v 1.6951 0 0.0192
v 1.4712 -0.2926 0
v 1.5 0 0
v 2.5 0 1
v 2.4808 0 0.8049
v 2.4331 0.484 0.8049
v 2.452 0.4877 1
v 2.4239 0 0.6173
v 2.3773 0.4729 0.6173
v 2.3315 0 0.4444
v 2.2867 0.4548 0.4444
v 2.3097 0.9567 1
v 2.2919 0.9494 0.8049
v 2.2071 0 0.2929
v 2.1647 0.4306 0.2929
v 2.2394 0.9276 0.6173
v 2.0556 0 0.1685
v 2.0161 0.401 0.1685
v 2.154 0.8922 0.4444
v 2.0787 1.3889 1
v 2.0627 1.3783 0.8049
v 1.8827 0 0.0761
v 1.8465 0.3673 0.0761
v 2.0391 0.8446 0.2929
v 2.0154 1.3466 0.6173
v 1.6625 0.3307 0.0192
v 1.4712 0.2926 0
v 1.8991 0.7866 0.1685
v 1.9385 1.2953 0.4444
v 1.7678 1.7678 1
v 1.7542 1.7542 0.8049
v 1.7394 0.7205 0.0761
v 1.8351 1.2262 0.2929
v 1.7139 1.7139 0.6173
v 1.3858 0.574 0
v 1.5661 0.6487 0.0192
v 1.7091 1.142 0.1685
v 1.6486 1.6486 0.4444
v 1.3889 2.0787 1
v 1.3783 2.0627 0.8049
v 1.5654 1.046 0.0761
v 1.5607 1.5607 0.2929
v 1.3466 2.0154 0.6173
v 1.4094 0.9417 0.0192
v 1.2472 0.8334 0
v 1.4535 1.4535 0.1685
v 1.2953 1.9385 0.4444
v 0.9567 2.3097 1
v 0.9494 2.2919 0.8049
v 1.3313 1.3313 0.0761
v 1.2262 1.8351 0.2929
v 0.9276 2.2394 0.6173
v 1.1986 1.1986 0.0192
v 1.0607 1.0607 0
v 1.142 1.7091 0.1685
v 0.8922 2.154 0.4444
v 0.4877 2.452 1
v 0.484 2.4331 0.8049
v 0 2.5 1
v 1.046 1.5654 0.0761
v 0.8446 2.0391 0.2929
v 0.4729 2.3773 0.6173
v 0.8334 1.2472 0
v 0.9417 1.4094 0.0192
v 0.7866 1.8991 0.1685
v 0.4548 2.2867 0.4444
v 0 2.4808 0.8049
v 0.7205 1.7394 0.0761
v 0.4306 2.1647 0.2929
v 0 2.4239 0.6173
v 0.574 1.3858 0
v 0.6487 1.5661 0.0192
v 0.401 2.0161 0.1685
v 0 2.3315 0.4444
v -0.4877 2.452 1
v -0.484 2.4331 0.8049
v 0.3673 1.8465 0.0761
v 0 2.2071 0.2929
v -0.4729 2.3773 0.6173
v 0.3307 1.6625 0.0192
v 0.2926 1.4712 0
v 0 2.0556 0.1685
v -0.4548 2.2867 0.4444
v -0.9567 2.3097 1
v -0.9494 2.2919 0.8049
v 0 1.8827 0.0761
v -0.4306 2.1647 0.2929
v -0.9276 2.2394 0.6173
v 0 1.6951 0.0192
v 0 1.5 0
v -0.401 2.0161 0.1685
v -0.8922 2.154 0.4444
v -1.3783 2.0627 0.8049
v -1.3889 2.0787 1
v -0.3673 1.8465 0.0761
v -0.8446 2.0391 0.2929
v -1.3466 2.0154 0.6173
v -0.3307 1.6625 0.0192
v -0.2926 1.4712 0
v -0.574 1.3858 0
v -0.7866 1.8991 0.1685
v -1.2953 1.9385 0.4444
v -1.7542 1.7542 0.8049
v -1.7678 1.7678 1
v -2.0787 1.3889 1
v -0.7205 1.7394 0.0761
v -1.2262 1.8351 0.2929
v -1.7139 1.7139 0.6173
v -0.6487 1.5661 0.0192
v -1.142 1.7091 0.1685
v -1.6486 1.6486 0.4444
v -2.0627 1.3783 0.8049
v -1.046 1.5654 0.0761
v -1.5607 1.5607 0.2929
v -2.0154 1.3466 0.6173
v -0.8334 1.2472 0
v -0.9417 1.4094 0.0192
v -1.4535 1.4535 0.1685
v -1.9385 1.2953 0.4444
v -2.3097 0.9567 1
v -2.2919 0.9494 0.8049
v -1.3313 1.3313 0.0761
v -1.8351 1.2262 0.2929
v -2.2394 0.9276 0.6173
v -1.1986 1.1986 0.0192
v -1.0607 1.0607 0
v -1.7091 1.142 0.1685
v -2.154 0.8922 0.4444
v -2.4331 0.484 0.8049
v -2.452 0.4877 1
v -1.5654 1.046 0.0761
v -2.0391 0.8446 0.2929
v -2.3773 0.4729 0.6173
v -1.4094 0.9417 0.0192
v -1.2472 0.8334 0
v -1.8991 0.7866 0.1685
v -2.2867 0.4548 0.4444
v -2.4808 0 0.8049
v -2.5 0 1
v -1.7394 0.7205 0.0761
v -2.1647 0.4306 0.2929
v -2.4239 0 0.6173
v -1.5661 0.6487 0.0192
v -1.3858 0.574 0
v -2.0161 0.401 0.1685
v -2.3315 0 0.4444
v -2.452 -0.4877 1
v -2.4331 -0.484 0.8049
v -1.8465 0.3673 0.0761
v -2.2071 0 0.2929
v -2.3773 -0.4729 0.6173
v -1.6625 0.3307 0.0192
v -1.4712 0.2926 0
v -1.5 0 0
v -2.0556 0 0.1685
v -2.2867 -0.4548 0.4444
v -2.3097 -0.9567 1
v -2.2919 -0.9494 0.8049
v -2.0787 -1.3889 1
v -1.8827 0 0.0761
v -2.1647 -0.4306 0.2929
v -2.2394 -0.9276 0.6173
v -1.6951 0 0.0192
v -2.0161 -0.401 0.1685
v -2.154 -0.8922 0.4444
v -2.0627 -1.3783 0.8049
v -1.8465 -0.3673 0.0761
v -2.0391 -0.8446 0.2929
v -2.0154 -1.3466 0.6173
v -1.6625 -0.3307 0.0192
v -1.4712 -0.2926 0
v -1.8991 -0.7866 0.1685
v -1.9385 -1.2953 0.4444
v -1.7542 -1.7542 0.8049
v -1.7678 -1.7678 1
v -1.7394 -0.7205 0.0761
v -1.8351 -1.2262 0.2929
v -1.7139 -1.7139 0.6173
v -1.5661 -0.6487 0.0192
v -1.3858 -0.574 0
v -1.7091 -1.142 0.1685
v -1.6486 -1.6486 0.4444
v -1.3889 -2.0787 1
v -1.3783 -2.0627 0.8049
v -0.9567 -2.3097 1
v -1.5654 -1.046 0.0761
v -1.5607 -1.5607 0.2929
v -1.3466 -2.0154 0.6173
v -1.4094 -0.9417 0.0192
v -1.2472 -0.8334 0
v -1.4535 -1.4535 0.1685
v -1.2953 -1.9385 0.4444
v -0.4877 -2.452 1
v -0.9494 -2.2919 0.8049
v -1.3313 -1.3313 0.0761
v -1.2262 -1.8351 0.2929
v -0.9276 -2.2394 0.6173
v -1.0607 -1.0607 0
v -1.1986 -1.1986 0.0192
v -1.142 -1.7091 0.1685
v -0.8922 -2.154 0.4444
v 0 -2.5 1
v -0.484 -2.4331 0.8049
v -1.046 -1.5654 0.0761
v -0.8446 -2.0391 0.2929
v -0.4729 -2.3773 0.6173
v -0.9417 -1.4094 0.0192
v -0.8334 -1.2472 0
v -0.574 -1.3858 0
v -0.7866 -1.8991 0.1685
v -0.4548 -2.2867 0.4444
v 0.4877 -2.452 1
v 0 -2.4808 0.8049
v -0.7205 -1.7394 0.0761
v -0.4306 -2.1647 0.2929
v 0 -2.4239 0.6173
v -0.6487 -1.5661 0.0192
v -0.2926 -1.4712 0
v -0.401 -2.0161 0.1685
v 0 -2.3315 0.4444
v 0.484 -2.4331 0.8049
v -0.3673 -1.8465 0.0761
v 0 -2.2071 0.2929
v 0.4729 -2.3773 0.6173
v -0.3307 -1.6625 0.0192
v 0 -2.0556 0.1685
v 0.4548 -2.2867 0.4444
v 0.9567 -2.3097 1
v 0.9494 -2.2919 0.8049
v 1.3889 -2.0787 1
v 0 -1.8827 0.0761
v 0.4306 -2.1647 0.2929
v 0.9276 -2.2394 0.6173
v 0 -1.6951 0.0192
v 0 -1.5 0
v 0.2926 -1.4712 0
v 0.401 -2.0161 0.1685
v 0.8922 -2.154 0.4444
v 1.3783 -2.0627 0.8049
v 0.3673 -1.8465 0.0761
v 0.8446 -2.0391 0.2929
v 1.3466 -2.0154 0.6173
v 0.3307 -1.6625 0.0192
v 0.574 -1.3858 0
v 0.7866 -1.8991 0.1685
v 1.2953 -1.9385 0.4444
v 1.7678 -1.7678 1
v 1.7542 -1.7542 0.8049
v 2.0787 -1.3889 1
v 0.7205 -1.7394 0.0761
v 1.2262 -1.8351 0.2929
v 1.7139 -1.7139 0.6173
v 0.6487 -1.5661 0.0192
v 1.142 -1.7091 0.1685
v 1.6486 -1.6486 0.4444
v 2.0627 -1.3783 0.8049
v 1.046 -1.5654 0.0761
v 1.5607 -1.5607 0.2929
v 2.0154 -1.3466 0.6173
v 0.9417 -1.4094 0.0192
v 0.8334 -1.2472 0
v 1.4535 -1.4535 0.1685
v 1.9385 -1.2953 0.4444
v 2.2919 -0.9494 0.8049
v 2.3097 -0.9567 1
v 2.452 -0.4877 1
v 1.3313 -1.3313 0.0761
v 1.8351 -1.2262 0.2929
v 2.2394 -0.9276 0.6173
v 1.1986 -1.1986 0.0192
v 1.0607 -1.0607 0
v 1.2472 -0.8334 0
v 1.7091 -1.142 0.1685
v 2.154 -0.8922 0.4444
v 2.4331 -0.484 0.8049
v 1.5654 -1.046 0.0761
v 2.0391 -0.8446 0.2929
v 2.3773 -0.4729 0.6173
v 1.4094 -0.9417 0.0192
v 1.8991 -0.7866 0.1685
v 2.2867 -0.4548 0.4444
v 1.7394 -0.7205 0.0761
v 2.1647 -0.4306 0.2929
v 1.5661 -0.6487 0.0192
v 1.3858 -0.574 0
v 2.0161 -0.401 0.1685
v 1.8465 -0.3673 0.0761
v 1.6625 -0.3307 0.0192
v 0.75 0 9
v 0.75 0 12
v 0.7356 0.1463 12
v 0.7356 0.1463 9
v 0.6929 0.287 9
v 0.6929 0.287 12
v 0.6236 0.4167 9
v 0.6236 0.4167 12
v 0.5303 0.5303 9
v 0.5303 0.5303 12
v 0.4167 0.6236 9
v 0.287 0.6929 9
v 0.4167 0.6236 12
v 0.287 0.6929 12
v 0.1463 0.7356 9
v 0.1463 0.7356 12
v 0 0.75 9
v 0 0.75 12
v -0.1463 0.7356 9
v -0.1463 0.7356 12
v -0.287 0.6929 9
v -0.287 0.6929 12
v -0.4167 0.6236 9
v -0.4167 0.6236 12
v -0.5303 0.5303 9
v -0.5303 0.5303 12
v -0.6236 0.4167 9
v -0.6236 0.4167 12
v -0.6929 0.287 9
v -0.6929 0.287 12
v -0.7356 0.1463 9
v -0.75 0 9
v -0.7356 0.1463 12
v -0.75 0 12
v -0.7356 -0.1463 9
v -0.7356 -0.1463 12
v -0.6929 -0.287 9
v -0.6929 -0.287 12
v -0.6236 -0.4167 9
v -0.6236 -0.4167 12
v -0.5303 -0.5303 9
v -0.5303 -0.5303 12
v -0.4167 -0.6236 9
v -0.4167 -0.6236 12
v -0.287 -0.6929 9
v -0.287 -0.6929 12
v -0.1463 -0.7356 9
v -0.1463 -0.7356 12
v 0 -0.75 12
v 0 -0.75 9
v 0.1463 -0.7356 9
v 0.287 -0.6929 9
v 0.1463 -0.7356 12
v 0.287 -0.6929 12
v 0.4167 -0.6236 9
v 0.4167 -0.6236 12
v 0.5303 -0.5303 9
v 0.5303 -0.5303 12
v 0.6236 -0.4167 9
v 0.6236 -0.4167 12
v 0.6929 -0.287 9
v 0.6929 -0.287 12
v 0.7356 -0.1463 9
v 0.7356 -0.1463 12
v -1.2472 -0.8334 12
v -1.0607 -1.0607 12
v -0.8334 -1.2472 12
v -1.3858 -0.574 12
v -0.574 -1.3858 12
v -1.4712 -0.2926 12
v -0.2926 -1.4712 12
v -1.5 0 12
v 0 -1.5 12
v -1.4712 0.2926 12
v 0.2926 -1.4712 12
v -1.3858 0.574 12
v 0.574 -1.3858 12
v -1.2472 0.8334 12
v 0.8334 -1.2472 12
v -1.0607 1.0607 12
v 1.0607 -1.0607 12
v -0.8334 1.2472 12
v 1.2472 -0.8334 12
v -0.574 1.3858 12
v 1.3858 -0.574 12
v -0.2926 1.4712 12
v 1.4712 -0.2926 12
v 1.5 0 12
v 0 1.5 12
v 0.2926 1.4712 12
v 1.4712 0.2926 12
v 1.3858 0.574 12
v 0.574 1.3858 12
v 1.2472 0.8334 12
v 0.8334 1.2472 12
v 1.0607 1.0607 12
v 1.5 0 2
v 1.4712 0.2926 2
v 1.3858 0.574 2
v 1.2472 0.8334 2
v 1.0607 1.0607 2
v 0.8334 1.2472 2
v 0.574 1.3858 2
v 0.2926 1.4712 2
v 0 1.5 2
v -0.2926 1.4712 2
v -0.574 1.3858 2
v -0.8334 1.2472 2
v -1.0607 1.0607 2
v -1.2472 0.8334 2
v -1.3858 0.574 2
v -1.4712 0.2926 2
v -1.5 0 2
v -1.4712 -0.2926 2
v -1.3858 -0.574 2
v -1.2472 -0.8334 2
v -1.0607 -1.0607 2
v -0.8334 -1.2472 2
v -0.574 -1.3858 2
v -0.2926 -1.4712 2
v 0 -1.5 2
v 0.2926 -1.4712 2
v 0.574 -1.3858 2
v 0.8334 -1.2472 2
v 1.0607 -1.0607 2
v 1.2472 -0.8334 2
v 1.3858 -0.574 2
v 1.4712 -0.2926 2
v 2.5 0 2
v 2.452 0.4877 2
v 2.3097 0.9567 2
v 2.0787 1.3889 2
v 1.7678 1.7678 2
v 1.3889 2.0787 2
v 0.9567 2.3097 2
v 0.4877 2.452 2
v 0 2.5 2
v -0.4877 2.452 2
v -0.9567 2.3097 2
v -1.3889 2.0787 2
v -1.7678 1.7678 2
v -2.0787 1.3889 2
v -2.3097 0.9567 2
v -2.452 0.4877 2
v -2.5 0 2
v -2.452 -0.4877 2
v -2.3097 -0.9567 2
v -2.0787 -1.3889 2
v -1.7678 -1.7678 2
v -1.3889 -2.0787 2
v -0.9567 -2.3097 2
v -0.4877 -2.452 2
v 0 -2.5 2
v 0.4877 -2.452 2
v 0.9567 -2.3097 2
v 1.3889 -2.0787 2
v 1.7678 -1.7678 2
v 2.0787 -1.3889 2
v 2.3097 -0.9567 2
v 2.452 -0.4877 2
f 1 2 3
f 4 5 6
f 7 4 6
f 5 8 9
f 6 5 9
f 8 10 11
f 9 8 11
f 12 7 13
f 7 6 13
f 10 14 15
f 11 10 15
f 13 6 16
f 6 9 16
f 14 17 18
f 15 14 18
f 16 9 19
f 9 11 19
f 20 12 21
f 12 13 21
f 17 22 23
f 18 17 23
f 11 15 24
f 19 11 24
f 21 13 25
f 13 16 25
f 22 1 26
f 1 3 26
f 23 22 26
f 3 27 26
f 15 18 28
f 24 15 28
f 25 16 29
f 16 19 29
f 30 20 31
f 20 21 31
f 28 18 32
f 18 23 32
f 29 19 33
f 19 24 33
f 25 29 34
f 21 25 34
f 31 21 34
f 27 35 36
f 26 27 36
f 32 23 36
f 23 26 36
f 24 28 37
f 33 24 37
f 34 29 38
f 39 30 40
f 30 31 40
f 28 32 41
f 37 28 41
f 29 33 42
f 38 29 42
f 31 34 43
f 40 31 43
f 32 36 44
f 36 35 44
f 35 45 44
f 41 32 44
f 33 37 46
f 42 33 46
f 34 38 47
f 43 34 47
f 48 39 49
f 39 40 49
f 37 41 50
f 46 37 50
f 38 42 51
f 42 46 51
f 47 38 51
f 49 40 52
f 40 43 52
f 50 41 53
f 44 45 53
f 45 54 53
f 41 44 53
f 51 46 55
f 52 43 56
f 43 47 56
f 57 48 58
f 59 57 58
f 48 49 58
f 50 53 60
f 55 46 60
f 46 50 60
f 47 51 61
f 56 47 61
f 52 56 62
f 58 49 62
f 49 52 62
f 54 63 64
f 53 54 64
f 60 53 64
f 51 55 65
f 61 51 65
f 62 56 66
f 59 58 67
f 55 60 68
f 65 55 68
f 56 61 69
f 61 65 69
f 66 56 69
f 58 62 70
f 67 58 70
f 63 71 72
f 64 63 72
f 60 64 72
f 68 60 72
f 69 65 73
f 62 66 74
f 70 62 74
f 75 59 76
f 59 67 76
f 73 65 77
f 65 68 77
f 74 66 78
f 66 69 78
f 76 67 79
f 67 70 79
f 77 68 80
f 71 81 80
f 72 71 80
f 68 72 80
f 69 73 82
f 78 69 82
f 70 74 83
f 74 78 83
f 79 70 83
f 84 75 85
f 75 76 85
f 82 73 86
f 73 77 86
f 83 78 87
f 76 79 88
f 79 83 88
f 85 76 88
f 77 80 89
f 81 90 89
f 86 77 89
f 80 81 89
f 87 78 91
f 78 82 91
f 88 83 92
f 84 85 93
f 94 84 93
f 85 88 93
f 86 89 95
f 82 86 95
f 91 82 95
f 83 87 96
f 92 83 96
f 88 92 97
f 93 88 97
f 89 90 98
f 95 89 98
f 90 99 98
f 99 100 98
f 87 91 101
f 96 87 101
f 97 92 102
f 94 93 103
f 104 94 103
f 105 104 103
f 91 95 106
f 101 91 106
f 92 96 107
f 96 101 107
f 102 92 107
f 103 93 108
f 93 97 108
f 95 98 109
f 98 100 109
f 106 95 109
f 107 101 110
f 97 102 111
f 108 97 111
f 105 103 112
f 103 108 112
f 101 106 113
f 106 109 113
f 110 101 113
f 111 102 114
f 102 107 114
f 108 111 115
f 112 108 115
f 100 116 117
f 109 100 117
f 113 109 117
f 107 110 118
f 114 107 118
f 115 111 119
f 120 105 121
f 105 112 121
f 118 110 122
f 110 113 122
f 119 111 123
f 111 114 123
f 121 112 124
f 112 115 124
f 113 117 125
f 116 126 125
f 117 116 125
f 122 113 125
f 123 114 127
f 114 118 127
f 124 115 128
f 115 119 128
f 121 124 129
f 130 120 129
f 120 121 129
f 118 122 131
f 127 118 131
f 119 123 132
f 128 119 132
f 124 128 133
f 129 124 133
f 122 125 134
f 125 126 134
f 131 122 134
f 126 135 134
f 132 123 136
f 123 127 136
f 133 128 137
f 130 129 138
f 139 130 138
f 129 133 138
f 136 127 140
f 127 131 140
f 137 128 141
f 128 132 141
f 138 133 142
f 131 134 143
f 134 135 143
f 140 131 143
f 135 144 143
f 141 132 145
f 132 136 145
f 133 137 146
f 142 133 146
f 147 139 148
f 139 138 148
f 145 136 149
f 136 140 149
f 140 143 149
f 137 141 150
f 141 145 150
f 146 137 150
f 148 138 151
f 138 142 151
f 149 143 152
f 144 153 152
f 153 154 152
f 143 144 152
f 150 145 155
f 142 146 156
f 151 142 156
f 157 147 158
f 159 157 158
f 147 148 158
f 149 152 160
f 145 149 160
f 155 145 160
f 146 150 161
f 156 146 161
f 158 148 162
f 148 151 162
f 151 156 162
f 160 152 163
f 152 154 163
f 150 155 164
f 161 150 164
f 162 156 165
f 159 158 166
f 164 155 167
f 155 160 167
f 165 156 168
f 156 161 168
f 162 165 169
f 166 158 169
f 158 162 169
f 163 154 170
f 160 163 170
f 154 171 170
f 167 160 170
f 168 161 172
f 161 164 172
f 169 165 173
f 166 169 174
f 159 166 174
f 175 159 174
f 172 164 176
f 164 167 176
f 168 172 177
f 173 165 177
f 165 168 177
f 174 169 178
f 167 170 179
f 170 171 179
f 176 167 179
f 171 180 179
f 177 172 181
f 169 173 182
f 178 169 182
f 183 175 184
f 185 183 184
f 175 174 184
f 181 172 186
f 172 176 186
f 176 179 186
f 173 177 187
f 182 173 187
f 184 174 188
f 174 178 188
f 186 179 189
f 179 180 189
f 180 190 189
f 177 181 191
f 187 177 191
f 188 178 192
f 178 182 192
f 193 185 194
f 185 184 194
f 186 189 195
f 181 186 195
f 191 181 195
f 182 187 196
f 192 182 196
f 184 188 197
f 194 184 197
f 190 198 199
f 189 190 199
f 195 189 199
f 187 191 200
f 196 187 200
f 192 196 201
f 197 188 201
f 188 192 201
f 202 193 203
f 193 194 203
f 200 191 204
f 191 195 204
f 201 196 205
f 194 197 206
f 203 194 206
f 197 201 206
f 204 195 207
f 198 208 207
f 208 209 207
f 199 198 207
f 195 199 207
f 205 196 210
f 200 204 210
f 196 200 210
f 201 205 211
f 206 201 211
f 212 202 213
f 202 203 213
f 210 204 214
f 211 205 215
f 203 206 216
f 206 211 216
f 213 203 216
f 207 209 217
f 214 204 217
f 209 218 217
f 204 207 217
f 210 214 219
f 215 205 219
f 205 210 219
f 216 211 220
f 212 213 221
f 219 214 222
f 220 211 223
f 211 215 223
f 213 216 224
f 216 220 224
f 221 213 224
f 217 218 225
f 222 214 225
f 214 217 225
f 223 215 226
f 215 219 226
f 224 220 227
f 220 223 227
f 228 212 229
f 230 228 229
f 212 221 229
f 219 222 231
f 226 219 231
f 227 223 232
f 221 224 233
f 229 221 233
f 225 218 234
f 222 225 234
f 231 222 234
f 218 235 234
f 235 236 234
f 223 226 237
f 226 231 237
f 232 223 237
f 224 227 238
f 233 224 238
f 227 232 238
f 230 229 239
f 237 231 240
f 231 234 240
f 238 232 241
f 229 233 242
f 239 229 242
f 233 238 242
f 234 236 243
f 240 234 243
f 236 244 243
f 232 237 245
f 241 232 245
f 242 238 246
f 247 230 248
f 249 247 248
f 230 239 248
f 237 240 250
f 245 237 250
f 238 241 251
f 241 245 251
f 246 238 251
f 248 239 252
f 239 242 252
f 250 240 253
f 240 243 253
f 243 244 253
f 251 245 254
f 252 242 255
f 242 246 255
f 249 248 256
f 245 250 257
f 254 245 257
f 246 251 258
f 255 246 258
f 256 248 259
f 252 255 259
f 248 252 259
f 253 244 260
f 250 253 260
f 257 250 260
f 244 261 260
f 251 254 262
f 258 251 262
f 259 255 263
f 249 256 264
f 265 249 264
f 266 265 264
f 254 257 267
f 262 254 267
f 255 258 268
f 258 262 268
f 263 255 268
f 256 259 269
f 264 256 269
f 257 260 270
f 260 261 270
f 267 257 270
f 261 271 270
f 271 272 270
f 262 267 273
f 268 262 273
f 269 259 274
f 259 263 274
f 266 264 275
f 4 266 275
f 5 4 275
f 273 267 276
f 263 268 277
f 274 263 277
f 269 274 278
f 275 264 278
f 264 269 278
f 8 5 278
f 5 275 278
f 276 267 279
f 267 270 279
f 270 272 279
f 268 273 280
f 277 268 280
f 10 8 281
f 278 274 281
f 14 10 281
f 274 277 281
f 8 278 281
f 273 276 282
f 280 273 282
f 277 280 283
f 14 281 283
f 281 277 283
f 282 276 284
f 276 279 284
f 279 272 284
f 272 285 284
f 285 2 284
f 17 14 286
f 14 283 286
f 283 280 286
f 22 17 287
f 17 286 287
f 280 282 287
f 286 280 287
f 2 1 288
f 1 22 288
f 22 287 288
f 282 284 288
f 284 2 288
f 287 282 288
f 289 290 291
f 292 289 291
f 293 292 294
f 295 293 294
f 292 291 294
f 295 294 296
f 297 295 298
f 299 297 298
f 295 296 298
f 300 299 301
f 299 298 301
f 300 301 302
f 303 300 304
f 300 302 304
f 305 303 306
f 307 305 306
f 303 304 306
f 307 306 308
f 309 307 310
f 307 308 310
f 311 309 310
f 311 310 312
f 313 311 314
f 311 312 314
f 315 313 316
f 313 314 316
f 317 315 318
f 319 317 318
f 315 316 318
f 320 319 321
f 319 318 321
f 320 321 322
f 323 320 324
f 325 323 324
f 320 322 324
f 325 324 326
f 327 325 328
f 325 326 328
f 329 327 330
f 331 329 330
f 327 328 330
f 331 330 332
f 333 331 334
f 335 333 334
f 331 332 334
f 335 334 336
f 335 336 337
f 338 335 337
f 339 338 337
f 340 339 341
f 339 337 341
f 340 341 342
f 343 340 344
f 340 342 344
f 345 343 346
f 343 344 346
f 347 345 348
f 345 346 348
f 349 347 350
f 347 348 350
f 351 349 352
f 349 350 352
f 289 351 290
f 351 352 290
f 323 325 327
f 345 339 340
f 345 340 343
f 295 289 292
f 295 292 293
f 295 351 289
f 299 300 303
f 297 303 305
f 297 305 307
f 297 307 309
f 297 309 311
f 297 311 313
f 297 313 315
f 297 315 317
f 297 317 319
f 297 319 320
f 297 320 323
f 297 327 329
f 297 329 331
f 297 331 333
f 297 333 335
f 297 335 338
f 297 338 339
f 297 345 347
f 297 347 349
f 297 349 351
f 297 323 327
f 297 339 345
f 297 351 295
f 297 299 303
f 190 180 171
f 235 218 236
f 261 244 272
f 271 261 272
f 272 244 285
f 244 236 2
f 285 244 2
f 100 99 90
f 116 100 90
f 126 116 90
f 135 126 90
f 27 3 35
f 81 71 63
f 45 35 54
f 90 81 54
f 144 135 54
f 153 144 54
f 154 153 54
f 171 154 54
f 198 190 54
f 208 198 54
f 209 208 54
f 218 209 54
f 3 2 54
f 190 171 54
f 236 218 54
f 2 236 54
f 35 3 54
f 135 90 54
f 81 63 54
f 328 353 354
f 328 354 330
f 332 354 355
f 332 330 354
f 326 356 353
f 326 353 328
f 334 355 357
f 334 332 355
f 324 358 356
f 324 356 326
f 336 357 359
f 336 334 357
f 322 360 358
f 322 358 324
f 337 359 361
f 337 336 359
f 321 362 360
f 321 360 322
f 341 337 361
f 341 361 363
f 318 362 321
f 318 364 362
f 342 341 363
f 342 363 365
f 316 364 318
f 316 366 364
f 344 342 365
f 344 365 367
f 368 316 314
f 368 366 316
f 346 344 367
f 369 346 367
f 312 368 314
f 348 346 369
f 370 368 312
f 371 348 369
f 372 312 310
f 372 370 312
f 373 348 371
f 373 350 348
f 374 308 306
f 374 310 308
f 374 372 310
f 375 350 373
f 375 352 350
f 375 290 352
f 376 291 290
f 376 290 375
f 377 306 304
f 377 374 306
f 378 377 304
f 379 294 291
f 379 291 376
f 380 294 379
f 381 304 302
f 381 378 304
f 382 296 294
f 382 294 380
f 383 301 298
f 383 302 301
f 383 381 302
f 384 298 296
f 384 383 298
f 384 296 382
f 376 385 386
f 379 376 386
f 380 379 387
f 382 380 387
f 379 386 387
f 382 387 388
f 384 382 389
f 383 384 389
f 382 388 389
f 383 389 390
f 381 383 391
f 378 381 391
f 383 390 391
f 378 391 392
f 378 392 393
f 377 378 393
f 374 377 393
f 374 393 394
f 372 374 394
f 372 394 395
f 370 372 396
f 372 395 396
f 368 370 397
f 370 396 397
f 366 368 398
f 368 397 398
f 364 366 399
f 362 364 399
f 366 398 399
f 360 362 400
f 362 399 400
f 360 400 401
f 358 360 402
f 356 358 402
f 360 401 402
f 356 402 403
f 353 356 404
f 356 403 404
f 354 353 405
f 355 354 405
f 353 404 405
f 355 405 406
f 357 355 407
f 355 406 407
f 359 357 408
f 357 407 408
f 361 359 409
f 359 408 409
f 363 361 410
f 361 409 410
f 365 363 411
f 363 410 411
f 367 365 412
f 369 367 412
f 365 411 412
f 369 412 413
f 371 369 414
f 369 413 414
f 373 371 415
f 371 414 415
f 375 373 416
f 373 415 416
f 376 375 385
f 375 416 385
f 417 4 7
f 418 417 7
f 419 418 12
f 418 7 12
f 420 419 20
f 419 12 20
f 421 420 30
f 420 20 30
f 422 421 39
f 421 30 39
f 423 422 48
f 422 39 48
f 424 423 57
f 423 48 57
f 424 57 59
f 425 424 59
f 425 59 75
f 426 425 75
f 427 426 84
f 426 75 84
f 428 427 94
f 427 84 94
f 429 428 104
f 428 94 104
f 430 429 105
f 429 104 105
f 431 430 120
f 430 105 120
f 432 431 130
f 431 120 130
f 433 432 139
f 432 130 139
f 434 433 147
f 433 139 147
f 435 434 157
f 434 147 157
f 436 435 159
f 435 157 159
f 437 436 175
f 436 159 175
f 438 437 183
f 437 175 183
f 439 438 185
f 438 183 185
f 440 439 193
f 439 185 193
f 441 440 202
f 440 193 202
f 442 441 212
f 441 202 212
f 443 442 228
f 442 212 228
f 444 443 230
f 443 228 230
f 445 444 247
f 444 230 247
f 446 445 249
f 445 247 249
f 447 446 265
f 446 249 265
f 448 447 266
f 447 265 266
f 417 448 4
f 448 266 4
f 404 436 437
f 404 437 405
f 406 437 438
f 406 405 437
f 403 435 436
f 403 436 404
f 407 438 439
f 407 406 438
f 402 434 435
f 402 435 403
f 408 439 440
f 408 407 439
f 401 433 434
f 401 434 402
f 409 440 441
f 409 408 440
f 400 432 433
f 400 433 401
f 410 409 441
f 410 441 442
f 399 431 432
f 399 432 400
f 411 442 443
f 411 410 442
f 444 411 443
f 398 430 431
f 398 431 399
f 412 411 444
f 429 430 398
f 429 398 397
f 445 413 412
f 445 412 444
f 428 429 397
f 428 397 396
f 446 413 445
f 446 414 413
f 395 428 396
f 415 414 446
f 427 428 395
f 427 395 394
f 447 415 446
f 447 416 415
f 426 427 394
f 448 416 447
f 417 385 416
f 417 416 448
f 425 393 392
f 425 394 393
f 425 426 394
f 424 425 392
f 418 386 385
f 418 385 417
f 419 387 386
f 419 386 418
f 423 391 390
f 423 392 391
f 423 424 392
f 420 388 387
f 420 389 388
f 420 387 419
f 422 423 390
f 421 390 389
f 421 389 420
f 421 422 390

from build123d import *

# Parameters (mm, degrees)
SKETCH_R     = 2.5
PAD_DEPTH    = 2
FILLET_R     = 1
SKETCH001_R  = 1.5
PAD001_DEPTH = 10
SKETCH002_R  = 0.75
POCKET_DEPTH = 3


with BuildPart() as part:
    # Sketch → Pad (new body)
    with BuildSketch(Plane.XY):
        Circle(SKETCH_R)
    extrude(amount=PAD_DEPTH)

    # Fillet
    fillet_edges = [part.edges().sort_by_distance(p)[0] for p in [
        (-2.5, 0, 0),
    ]]
    fillet(fillet_edges, radius=FILLET_R)

    # Sketch001 (on DatumPlane) → Pad001 (join)
    with BuildSketch(Plane.XY.offset(2)):
        Circle(SKETCH001_R)
    extrude(amount=PAD001_DEPTH)

    # Sketch002 (on DatumPlane) → Pocket (cut)
    with BuildSketch(Plane.XY.offset(12)):
        Circle(SKETCH002_R)
    extrude(amount=-POCKET_DEPTH, mode=Mode.SUBTRACT)


solid = part.part
